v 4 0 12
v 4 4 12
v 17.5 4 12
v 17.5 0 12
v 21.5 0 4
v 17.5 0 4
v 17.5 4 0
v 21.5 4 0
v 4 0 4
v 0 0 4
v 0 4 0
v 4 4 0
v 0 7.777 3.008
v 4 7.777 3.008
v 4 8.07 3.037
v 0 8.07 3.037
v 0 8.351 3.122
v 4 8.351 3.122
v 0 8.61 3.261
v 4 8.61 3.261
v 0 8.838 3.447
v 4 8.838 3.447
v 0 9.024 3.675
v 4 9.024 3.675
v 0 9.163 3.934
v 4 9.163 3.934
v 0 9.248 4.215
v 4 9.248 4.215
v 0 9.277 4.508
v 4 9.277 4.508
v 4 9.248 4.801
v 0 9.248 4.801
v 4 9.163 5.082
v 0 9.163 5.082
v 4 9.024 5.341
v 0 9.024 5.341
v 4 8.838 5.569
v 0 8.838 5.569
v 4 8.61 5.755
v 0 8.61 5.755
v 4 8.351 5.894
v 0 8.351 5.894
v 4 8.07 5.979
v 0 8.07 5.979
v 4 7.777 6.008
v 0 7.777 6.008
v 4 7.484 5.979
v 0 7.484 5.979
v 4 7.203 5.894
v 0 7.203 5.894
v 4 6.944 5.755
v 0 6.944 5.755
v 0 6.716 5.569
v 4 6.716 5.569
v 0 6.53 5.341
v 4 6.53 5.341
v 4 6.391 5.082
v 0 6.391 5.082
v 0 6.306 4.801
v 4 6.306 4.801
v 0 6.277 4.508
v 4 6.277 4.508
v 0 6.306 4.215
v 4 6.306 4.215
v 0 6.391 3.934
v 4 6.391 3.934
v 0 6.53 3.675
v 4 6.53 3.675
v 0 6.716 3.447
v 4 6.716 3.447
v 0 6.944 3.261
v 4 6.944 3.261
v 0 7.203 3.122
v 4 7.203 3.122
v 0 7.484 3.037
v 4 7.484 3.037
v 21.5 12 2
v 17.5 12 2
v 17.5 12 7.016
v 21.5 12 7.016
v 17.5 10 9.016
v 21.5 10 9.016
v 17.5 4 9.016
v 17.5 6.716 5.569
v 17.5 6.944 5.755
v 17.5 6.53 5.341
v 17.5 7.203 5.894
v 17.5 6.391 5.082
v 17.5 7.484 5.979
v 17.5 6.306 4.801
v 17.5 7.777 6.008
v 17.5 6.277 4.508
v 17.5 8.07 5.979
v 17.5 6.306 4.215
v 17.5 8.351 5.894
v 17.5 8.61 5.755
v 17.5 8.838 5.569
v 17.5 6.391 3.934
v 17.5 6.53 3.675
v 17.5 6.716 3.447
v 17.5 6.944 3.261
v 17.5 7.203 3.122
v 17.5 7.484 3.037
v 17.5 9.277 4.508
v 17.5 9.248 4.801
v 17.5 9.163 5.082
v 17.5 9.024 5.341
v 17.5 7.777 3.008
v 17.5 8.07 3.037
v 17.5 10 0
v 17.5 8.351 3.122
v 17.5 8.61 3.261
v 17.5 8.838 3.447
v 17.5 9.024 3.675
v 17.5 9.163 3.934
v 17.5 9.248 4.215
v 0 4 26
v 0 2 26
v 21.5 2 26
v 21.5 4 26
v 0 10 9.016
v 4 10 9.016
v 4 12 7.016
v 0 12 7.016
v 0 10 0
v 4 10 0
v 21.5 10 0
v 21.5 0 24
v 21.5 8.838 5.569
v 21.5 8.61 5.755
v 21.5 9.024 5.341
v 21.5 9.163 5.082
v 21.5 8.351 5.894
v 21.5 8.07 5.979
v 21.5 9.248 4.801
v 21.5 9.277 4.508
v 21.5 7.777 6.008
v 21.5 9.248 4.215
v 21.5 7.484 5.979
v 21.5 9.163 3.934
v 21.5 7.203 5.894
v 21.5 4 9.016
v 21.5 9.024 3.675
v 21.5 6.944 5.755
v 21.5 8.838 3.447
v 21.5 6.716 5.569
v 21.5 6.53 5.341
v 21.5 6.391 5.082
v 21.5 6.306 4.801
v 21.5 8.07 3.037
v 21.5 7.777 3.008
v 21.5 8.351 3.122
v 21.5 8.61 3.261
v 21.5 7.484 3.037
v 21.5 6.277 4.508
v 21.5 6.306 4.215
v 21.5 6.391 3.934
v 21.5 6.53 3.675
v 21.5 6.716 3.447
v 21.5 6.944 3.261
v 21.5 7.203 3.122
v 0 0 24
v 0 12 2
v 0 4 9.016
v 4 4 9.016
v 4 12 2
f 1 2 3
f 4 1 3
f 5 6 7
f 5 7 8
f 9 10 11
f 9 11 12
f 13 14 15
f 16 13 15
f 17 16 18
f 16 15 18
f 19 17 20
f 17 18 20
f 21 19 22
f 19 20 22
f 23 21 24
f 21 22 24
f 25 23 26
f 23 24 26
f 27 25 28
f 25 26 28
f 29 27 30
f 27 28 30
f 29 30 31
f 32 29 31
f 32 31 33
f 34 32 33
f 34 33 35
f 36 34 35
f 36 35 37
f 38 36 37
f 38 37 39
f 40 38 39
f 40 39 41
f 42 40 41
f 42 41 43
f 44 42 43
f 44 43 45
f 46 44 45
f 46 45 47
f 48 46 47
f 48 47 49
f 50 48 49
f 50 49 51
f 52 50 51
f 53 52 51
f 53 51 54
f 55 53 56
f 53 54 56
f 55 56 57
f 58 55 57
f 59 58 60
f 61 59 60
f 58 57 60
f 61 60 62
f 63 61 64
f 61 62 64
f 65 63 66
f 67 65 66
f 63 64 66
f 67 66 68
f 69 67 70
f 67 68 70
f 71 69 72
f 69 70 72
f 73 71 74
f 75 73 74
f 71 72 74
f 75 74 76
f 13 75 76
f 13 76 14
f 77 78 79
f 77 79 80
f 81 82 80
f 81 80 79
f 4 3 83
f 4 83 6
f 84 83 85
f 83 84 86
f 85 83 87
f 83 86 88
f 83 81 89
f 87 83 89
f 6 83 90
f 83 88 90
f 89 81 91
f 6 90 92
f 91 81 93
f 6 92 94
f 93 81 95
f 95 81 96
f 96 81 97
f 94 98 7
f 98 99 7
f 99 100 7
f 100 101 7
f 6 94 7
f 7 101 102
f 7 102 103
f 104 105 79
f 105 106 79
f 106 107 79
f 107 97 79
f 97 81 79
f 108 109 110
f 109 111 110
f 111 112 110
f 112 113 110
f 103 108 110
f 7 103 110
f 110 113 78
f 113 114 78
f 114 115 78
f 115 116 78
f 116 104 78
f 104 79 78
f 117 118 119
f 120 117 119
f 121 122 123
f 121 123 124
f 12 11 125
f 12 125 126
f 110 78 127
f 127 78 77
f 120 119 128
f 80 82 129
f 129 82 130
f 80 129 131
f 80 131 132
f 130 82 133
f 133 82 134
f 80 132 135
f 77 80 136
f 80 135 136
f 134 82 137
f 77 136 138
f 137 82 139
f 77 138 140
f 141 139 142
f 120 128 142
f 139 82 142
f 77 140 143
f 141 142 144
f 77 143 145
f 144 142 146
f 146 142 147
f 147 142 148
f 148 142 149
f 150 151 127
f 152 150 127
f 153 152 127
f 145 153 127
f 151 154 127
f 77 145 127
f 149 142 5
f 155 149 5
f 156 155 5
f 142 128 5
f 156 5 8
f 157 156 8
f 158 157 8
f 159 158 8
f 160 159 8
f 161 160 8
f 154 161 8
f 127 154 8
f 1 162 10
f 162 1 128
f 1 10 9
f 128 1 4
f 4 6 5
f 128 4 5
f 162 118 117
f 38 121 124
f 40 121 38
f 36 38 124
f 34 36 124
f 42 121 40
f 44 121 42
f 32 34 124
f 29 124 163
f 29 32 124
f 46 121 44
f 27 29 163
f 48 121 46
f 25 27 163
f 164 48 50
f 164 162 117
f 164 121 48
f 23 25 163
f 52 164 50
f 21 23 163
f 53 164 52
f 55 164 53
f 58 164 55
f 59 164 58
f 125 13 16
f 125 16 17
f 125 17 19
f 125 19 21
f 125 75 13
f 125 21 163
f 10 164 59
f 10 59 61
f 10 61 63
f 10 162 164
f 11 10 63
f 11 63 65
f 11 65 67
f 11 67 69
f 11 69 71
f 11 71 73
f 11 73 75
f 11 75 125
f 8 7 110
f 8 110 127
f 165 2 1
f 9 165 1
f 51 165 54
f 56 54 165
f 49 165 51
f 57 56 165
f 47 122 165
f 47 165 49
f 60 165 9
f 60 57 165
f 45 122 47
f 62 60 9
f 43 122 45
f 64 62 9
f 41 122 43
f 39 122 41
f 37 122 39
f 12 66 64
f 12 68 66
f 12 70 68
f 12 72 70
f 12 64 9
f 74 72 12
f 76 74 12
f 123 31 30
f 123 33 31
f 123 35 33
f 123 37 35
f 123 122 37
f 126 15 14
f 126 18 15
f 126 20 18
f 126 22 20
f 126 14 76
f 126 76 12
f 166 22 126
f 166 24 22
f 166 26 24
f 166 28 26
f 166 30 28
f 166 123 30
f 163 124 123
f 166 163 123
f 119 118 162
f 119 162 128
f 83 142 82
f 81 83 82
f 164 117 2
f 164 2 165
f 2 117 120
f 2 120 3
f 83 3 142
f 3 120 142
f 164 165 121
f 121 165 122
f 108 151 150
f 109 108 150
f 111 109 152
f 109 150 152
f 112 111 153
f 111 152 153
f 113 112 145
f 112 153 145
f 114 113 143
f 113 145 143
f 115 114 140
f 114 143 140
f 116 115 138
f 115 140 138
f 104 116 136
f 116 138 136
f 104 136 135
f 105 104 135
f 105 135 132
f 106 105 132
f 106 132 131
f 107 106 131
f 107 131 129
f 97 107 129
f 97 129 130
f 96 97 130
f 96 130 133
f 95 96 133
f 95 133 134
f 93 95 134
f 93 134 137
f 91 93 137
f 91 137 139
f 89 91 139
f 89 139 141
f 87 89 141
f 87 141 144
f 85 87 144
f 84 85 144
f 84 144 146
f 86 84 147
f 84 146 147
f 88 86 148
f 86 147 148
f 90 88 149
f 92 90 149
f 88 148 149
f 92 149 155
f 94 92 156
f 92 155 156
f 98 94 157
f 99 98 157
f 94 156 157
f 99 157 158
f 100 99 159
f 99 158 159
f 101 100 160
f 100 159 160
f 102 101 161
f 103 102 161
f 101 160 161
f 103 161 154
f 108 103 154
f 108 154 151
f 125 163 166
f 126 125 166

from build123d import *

# Parameters (mm, degrees)
SKETCH_1_W          = 21.5
SKETCH_1_H          = 26
EXTRUDE_1_DEPTH     = 12
SKETCH_2_W          = 22.422219076
SKETCH_2_H          = 9.017669608
CUT_EXTRUDE_1_DEPTH = 36.80851854
CHAMFER_1_SIZE      = 2
CHAMFER_2_SIZE      = 4
SKETCH_3_R          = 1.5
CUT_EXTRUDE_2_DEPTH = 36.80851854
SKETCH_4_W          = 13.5
SKETCH_4_H          = 18.032522109
CUT_EXTRUDE_3_DEPTH = 36.80851854
CHAMFER_3_SIZE      = 2


with BuildPart() as part:
    # Эскиз1 → Вытянуть1 (new body)
    with BuildSketch(Plane(origin=(0, 0, 0), x_dir=(1, 0, 0), z_dir=(0, 1, 0))):
        with Locations((10.75, -13)):
            Rectangle(SKETCH_1_W, SKETCH_1_H)
    extrude(amount=EXTRUDE_1_DEPTH)

    # Эскиз2 → Вырез-Вытянуть1 (cut, through all)
    with BuildSketch(Plane(origin=(21.5, 0, 0), x_dir=(0, 0, -1), z_dir=(1, 0, 0))):
        with Locations((-20.227370593, 8.508834804)):
            Rectangle(SKETCH_2_W, SKETCH_2_H)
    extrude(amount=-CUT_EXTRUDE_1_DEPTH, mode=Mode.SUBTRACT)

    # Фаска1
    chamfer_1_edges = [part.edges().sort_by_distance(p)[0] for p in [
        (10.75, 12, 0),
        (10.75, 12, 9.016261055),
    ]]
    chamfer(chamfer_1_edges, length=CHAMFER_1_SIZE)

    # Фаска2
    chamfer_2_edges = [part.edges().sort_by_distance(p)[0] for p in [
        (10.75, 0, 0),
    ]]
    chamfer(chamfer_2_edges, length=CHAMFER_2_SIZE)

    # Эскиз3 → Вырез-Вытянуть2 (cut, through all)
    with BuildSketch(Plane(origin=(21.5, 0, 0), x_dir=(0, 0, -1), z_dir=(1, 0, 0))):
        with Locations((-4.508130527, 7.777054312)):
            Circle(SKETCH_3_R)
    extrude(amount=-CUT_EXTRUDE_2_DEPTH, mode=Mode.SUBTRACT)

    # Эскиз4 → Вырез-Вытянуть3 (cut, through all)
    with BuildSketch(Plane(origin=(0, 12, 0), x_dir=(1, 0, 0), z_dir=(0, 1, 0))):
        with Locations((10.75, -2.983738945)):
            Rectangle(SKETCH_4_W, SKETCH_4_H)
    extrude(amount=-CUT_EXTRUDE_3_DEPTH, mode=Mode.SUBTRACT)

    # Фаска3
    chamfer_3_edges = [part.edges().sort_by_distance(p)[0] for p in [
        (10.75, 0, 26),
    ]]
    chamfer(chamfer_3_edges, length=CHAMFER_3_SIZE)


solid = part.part
